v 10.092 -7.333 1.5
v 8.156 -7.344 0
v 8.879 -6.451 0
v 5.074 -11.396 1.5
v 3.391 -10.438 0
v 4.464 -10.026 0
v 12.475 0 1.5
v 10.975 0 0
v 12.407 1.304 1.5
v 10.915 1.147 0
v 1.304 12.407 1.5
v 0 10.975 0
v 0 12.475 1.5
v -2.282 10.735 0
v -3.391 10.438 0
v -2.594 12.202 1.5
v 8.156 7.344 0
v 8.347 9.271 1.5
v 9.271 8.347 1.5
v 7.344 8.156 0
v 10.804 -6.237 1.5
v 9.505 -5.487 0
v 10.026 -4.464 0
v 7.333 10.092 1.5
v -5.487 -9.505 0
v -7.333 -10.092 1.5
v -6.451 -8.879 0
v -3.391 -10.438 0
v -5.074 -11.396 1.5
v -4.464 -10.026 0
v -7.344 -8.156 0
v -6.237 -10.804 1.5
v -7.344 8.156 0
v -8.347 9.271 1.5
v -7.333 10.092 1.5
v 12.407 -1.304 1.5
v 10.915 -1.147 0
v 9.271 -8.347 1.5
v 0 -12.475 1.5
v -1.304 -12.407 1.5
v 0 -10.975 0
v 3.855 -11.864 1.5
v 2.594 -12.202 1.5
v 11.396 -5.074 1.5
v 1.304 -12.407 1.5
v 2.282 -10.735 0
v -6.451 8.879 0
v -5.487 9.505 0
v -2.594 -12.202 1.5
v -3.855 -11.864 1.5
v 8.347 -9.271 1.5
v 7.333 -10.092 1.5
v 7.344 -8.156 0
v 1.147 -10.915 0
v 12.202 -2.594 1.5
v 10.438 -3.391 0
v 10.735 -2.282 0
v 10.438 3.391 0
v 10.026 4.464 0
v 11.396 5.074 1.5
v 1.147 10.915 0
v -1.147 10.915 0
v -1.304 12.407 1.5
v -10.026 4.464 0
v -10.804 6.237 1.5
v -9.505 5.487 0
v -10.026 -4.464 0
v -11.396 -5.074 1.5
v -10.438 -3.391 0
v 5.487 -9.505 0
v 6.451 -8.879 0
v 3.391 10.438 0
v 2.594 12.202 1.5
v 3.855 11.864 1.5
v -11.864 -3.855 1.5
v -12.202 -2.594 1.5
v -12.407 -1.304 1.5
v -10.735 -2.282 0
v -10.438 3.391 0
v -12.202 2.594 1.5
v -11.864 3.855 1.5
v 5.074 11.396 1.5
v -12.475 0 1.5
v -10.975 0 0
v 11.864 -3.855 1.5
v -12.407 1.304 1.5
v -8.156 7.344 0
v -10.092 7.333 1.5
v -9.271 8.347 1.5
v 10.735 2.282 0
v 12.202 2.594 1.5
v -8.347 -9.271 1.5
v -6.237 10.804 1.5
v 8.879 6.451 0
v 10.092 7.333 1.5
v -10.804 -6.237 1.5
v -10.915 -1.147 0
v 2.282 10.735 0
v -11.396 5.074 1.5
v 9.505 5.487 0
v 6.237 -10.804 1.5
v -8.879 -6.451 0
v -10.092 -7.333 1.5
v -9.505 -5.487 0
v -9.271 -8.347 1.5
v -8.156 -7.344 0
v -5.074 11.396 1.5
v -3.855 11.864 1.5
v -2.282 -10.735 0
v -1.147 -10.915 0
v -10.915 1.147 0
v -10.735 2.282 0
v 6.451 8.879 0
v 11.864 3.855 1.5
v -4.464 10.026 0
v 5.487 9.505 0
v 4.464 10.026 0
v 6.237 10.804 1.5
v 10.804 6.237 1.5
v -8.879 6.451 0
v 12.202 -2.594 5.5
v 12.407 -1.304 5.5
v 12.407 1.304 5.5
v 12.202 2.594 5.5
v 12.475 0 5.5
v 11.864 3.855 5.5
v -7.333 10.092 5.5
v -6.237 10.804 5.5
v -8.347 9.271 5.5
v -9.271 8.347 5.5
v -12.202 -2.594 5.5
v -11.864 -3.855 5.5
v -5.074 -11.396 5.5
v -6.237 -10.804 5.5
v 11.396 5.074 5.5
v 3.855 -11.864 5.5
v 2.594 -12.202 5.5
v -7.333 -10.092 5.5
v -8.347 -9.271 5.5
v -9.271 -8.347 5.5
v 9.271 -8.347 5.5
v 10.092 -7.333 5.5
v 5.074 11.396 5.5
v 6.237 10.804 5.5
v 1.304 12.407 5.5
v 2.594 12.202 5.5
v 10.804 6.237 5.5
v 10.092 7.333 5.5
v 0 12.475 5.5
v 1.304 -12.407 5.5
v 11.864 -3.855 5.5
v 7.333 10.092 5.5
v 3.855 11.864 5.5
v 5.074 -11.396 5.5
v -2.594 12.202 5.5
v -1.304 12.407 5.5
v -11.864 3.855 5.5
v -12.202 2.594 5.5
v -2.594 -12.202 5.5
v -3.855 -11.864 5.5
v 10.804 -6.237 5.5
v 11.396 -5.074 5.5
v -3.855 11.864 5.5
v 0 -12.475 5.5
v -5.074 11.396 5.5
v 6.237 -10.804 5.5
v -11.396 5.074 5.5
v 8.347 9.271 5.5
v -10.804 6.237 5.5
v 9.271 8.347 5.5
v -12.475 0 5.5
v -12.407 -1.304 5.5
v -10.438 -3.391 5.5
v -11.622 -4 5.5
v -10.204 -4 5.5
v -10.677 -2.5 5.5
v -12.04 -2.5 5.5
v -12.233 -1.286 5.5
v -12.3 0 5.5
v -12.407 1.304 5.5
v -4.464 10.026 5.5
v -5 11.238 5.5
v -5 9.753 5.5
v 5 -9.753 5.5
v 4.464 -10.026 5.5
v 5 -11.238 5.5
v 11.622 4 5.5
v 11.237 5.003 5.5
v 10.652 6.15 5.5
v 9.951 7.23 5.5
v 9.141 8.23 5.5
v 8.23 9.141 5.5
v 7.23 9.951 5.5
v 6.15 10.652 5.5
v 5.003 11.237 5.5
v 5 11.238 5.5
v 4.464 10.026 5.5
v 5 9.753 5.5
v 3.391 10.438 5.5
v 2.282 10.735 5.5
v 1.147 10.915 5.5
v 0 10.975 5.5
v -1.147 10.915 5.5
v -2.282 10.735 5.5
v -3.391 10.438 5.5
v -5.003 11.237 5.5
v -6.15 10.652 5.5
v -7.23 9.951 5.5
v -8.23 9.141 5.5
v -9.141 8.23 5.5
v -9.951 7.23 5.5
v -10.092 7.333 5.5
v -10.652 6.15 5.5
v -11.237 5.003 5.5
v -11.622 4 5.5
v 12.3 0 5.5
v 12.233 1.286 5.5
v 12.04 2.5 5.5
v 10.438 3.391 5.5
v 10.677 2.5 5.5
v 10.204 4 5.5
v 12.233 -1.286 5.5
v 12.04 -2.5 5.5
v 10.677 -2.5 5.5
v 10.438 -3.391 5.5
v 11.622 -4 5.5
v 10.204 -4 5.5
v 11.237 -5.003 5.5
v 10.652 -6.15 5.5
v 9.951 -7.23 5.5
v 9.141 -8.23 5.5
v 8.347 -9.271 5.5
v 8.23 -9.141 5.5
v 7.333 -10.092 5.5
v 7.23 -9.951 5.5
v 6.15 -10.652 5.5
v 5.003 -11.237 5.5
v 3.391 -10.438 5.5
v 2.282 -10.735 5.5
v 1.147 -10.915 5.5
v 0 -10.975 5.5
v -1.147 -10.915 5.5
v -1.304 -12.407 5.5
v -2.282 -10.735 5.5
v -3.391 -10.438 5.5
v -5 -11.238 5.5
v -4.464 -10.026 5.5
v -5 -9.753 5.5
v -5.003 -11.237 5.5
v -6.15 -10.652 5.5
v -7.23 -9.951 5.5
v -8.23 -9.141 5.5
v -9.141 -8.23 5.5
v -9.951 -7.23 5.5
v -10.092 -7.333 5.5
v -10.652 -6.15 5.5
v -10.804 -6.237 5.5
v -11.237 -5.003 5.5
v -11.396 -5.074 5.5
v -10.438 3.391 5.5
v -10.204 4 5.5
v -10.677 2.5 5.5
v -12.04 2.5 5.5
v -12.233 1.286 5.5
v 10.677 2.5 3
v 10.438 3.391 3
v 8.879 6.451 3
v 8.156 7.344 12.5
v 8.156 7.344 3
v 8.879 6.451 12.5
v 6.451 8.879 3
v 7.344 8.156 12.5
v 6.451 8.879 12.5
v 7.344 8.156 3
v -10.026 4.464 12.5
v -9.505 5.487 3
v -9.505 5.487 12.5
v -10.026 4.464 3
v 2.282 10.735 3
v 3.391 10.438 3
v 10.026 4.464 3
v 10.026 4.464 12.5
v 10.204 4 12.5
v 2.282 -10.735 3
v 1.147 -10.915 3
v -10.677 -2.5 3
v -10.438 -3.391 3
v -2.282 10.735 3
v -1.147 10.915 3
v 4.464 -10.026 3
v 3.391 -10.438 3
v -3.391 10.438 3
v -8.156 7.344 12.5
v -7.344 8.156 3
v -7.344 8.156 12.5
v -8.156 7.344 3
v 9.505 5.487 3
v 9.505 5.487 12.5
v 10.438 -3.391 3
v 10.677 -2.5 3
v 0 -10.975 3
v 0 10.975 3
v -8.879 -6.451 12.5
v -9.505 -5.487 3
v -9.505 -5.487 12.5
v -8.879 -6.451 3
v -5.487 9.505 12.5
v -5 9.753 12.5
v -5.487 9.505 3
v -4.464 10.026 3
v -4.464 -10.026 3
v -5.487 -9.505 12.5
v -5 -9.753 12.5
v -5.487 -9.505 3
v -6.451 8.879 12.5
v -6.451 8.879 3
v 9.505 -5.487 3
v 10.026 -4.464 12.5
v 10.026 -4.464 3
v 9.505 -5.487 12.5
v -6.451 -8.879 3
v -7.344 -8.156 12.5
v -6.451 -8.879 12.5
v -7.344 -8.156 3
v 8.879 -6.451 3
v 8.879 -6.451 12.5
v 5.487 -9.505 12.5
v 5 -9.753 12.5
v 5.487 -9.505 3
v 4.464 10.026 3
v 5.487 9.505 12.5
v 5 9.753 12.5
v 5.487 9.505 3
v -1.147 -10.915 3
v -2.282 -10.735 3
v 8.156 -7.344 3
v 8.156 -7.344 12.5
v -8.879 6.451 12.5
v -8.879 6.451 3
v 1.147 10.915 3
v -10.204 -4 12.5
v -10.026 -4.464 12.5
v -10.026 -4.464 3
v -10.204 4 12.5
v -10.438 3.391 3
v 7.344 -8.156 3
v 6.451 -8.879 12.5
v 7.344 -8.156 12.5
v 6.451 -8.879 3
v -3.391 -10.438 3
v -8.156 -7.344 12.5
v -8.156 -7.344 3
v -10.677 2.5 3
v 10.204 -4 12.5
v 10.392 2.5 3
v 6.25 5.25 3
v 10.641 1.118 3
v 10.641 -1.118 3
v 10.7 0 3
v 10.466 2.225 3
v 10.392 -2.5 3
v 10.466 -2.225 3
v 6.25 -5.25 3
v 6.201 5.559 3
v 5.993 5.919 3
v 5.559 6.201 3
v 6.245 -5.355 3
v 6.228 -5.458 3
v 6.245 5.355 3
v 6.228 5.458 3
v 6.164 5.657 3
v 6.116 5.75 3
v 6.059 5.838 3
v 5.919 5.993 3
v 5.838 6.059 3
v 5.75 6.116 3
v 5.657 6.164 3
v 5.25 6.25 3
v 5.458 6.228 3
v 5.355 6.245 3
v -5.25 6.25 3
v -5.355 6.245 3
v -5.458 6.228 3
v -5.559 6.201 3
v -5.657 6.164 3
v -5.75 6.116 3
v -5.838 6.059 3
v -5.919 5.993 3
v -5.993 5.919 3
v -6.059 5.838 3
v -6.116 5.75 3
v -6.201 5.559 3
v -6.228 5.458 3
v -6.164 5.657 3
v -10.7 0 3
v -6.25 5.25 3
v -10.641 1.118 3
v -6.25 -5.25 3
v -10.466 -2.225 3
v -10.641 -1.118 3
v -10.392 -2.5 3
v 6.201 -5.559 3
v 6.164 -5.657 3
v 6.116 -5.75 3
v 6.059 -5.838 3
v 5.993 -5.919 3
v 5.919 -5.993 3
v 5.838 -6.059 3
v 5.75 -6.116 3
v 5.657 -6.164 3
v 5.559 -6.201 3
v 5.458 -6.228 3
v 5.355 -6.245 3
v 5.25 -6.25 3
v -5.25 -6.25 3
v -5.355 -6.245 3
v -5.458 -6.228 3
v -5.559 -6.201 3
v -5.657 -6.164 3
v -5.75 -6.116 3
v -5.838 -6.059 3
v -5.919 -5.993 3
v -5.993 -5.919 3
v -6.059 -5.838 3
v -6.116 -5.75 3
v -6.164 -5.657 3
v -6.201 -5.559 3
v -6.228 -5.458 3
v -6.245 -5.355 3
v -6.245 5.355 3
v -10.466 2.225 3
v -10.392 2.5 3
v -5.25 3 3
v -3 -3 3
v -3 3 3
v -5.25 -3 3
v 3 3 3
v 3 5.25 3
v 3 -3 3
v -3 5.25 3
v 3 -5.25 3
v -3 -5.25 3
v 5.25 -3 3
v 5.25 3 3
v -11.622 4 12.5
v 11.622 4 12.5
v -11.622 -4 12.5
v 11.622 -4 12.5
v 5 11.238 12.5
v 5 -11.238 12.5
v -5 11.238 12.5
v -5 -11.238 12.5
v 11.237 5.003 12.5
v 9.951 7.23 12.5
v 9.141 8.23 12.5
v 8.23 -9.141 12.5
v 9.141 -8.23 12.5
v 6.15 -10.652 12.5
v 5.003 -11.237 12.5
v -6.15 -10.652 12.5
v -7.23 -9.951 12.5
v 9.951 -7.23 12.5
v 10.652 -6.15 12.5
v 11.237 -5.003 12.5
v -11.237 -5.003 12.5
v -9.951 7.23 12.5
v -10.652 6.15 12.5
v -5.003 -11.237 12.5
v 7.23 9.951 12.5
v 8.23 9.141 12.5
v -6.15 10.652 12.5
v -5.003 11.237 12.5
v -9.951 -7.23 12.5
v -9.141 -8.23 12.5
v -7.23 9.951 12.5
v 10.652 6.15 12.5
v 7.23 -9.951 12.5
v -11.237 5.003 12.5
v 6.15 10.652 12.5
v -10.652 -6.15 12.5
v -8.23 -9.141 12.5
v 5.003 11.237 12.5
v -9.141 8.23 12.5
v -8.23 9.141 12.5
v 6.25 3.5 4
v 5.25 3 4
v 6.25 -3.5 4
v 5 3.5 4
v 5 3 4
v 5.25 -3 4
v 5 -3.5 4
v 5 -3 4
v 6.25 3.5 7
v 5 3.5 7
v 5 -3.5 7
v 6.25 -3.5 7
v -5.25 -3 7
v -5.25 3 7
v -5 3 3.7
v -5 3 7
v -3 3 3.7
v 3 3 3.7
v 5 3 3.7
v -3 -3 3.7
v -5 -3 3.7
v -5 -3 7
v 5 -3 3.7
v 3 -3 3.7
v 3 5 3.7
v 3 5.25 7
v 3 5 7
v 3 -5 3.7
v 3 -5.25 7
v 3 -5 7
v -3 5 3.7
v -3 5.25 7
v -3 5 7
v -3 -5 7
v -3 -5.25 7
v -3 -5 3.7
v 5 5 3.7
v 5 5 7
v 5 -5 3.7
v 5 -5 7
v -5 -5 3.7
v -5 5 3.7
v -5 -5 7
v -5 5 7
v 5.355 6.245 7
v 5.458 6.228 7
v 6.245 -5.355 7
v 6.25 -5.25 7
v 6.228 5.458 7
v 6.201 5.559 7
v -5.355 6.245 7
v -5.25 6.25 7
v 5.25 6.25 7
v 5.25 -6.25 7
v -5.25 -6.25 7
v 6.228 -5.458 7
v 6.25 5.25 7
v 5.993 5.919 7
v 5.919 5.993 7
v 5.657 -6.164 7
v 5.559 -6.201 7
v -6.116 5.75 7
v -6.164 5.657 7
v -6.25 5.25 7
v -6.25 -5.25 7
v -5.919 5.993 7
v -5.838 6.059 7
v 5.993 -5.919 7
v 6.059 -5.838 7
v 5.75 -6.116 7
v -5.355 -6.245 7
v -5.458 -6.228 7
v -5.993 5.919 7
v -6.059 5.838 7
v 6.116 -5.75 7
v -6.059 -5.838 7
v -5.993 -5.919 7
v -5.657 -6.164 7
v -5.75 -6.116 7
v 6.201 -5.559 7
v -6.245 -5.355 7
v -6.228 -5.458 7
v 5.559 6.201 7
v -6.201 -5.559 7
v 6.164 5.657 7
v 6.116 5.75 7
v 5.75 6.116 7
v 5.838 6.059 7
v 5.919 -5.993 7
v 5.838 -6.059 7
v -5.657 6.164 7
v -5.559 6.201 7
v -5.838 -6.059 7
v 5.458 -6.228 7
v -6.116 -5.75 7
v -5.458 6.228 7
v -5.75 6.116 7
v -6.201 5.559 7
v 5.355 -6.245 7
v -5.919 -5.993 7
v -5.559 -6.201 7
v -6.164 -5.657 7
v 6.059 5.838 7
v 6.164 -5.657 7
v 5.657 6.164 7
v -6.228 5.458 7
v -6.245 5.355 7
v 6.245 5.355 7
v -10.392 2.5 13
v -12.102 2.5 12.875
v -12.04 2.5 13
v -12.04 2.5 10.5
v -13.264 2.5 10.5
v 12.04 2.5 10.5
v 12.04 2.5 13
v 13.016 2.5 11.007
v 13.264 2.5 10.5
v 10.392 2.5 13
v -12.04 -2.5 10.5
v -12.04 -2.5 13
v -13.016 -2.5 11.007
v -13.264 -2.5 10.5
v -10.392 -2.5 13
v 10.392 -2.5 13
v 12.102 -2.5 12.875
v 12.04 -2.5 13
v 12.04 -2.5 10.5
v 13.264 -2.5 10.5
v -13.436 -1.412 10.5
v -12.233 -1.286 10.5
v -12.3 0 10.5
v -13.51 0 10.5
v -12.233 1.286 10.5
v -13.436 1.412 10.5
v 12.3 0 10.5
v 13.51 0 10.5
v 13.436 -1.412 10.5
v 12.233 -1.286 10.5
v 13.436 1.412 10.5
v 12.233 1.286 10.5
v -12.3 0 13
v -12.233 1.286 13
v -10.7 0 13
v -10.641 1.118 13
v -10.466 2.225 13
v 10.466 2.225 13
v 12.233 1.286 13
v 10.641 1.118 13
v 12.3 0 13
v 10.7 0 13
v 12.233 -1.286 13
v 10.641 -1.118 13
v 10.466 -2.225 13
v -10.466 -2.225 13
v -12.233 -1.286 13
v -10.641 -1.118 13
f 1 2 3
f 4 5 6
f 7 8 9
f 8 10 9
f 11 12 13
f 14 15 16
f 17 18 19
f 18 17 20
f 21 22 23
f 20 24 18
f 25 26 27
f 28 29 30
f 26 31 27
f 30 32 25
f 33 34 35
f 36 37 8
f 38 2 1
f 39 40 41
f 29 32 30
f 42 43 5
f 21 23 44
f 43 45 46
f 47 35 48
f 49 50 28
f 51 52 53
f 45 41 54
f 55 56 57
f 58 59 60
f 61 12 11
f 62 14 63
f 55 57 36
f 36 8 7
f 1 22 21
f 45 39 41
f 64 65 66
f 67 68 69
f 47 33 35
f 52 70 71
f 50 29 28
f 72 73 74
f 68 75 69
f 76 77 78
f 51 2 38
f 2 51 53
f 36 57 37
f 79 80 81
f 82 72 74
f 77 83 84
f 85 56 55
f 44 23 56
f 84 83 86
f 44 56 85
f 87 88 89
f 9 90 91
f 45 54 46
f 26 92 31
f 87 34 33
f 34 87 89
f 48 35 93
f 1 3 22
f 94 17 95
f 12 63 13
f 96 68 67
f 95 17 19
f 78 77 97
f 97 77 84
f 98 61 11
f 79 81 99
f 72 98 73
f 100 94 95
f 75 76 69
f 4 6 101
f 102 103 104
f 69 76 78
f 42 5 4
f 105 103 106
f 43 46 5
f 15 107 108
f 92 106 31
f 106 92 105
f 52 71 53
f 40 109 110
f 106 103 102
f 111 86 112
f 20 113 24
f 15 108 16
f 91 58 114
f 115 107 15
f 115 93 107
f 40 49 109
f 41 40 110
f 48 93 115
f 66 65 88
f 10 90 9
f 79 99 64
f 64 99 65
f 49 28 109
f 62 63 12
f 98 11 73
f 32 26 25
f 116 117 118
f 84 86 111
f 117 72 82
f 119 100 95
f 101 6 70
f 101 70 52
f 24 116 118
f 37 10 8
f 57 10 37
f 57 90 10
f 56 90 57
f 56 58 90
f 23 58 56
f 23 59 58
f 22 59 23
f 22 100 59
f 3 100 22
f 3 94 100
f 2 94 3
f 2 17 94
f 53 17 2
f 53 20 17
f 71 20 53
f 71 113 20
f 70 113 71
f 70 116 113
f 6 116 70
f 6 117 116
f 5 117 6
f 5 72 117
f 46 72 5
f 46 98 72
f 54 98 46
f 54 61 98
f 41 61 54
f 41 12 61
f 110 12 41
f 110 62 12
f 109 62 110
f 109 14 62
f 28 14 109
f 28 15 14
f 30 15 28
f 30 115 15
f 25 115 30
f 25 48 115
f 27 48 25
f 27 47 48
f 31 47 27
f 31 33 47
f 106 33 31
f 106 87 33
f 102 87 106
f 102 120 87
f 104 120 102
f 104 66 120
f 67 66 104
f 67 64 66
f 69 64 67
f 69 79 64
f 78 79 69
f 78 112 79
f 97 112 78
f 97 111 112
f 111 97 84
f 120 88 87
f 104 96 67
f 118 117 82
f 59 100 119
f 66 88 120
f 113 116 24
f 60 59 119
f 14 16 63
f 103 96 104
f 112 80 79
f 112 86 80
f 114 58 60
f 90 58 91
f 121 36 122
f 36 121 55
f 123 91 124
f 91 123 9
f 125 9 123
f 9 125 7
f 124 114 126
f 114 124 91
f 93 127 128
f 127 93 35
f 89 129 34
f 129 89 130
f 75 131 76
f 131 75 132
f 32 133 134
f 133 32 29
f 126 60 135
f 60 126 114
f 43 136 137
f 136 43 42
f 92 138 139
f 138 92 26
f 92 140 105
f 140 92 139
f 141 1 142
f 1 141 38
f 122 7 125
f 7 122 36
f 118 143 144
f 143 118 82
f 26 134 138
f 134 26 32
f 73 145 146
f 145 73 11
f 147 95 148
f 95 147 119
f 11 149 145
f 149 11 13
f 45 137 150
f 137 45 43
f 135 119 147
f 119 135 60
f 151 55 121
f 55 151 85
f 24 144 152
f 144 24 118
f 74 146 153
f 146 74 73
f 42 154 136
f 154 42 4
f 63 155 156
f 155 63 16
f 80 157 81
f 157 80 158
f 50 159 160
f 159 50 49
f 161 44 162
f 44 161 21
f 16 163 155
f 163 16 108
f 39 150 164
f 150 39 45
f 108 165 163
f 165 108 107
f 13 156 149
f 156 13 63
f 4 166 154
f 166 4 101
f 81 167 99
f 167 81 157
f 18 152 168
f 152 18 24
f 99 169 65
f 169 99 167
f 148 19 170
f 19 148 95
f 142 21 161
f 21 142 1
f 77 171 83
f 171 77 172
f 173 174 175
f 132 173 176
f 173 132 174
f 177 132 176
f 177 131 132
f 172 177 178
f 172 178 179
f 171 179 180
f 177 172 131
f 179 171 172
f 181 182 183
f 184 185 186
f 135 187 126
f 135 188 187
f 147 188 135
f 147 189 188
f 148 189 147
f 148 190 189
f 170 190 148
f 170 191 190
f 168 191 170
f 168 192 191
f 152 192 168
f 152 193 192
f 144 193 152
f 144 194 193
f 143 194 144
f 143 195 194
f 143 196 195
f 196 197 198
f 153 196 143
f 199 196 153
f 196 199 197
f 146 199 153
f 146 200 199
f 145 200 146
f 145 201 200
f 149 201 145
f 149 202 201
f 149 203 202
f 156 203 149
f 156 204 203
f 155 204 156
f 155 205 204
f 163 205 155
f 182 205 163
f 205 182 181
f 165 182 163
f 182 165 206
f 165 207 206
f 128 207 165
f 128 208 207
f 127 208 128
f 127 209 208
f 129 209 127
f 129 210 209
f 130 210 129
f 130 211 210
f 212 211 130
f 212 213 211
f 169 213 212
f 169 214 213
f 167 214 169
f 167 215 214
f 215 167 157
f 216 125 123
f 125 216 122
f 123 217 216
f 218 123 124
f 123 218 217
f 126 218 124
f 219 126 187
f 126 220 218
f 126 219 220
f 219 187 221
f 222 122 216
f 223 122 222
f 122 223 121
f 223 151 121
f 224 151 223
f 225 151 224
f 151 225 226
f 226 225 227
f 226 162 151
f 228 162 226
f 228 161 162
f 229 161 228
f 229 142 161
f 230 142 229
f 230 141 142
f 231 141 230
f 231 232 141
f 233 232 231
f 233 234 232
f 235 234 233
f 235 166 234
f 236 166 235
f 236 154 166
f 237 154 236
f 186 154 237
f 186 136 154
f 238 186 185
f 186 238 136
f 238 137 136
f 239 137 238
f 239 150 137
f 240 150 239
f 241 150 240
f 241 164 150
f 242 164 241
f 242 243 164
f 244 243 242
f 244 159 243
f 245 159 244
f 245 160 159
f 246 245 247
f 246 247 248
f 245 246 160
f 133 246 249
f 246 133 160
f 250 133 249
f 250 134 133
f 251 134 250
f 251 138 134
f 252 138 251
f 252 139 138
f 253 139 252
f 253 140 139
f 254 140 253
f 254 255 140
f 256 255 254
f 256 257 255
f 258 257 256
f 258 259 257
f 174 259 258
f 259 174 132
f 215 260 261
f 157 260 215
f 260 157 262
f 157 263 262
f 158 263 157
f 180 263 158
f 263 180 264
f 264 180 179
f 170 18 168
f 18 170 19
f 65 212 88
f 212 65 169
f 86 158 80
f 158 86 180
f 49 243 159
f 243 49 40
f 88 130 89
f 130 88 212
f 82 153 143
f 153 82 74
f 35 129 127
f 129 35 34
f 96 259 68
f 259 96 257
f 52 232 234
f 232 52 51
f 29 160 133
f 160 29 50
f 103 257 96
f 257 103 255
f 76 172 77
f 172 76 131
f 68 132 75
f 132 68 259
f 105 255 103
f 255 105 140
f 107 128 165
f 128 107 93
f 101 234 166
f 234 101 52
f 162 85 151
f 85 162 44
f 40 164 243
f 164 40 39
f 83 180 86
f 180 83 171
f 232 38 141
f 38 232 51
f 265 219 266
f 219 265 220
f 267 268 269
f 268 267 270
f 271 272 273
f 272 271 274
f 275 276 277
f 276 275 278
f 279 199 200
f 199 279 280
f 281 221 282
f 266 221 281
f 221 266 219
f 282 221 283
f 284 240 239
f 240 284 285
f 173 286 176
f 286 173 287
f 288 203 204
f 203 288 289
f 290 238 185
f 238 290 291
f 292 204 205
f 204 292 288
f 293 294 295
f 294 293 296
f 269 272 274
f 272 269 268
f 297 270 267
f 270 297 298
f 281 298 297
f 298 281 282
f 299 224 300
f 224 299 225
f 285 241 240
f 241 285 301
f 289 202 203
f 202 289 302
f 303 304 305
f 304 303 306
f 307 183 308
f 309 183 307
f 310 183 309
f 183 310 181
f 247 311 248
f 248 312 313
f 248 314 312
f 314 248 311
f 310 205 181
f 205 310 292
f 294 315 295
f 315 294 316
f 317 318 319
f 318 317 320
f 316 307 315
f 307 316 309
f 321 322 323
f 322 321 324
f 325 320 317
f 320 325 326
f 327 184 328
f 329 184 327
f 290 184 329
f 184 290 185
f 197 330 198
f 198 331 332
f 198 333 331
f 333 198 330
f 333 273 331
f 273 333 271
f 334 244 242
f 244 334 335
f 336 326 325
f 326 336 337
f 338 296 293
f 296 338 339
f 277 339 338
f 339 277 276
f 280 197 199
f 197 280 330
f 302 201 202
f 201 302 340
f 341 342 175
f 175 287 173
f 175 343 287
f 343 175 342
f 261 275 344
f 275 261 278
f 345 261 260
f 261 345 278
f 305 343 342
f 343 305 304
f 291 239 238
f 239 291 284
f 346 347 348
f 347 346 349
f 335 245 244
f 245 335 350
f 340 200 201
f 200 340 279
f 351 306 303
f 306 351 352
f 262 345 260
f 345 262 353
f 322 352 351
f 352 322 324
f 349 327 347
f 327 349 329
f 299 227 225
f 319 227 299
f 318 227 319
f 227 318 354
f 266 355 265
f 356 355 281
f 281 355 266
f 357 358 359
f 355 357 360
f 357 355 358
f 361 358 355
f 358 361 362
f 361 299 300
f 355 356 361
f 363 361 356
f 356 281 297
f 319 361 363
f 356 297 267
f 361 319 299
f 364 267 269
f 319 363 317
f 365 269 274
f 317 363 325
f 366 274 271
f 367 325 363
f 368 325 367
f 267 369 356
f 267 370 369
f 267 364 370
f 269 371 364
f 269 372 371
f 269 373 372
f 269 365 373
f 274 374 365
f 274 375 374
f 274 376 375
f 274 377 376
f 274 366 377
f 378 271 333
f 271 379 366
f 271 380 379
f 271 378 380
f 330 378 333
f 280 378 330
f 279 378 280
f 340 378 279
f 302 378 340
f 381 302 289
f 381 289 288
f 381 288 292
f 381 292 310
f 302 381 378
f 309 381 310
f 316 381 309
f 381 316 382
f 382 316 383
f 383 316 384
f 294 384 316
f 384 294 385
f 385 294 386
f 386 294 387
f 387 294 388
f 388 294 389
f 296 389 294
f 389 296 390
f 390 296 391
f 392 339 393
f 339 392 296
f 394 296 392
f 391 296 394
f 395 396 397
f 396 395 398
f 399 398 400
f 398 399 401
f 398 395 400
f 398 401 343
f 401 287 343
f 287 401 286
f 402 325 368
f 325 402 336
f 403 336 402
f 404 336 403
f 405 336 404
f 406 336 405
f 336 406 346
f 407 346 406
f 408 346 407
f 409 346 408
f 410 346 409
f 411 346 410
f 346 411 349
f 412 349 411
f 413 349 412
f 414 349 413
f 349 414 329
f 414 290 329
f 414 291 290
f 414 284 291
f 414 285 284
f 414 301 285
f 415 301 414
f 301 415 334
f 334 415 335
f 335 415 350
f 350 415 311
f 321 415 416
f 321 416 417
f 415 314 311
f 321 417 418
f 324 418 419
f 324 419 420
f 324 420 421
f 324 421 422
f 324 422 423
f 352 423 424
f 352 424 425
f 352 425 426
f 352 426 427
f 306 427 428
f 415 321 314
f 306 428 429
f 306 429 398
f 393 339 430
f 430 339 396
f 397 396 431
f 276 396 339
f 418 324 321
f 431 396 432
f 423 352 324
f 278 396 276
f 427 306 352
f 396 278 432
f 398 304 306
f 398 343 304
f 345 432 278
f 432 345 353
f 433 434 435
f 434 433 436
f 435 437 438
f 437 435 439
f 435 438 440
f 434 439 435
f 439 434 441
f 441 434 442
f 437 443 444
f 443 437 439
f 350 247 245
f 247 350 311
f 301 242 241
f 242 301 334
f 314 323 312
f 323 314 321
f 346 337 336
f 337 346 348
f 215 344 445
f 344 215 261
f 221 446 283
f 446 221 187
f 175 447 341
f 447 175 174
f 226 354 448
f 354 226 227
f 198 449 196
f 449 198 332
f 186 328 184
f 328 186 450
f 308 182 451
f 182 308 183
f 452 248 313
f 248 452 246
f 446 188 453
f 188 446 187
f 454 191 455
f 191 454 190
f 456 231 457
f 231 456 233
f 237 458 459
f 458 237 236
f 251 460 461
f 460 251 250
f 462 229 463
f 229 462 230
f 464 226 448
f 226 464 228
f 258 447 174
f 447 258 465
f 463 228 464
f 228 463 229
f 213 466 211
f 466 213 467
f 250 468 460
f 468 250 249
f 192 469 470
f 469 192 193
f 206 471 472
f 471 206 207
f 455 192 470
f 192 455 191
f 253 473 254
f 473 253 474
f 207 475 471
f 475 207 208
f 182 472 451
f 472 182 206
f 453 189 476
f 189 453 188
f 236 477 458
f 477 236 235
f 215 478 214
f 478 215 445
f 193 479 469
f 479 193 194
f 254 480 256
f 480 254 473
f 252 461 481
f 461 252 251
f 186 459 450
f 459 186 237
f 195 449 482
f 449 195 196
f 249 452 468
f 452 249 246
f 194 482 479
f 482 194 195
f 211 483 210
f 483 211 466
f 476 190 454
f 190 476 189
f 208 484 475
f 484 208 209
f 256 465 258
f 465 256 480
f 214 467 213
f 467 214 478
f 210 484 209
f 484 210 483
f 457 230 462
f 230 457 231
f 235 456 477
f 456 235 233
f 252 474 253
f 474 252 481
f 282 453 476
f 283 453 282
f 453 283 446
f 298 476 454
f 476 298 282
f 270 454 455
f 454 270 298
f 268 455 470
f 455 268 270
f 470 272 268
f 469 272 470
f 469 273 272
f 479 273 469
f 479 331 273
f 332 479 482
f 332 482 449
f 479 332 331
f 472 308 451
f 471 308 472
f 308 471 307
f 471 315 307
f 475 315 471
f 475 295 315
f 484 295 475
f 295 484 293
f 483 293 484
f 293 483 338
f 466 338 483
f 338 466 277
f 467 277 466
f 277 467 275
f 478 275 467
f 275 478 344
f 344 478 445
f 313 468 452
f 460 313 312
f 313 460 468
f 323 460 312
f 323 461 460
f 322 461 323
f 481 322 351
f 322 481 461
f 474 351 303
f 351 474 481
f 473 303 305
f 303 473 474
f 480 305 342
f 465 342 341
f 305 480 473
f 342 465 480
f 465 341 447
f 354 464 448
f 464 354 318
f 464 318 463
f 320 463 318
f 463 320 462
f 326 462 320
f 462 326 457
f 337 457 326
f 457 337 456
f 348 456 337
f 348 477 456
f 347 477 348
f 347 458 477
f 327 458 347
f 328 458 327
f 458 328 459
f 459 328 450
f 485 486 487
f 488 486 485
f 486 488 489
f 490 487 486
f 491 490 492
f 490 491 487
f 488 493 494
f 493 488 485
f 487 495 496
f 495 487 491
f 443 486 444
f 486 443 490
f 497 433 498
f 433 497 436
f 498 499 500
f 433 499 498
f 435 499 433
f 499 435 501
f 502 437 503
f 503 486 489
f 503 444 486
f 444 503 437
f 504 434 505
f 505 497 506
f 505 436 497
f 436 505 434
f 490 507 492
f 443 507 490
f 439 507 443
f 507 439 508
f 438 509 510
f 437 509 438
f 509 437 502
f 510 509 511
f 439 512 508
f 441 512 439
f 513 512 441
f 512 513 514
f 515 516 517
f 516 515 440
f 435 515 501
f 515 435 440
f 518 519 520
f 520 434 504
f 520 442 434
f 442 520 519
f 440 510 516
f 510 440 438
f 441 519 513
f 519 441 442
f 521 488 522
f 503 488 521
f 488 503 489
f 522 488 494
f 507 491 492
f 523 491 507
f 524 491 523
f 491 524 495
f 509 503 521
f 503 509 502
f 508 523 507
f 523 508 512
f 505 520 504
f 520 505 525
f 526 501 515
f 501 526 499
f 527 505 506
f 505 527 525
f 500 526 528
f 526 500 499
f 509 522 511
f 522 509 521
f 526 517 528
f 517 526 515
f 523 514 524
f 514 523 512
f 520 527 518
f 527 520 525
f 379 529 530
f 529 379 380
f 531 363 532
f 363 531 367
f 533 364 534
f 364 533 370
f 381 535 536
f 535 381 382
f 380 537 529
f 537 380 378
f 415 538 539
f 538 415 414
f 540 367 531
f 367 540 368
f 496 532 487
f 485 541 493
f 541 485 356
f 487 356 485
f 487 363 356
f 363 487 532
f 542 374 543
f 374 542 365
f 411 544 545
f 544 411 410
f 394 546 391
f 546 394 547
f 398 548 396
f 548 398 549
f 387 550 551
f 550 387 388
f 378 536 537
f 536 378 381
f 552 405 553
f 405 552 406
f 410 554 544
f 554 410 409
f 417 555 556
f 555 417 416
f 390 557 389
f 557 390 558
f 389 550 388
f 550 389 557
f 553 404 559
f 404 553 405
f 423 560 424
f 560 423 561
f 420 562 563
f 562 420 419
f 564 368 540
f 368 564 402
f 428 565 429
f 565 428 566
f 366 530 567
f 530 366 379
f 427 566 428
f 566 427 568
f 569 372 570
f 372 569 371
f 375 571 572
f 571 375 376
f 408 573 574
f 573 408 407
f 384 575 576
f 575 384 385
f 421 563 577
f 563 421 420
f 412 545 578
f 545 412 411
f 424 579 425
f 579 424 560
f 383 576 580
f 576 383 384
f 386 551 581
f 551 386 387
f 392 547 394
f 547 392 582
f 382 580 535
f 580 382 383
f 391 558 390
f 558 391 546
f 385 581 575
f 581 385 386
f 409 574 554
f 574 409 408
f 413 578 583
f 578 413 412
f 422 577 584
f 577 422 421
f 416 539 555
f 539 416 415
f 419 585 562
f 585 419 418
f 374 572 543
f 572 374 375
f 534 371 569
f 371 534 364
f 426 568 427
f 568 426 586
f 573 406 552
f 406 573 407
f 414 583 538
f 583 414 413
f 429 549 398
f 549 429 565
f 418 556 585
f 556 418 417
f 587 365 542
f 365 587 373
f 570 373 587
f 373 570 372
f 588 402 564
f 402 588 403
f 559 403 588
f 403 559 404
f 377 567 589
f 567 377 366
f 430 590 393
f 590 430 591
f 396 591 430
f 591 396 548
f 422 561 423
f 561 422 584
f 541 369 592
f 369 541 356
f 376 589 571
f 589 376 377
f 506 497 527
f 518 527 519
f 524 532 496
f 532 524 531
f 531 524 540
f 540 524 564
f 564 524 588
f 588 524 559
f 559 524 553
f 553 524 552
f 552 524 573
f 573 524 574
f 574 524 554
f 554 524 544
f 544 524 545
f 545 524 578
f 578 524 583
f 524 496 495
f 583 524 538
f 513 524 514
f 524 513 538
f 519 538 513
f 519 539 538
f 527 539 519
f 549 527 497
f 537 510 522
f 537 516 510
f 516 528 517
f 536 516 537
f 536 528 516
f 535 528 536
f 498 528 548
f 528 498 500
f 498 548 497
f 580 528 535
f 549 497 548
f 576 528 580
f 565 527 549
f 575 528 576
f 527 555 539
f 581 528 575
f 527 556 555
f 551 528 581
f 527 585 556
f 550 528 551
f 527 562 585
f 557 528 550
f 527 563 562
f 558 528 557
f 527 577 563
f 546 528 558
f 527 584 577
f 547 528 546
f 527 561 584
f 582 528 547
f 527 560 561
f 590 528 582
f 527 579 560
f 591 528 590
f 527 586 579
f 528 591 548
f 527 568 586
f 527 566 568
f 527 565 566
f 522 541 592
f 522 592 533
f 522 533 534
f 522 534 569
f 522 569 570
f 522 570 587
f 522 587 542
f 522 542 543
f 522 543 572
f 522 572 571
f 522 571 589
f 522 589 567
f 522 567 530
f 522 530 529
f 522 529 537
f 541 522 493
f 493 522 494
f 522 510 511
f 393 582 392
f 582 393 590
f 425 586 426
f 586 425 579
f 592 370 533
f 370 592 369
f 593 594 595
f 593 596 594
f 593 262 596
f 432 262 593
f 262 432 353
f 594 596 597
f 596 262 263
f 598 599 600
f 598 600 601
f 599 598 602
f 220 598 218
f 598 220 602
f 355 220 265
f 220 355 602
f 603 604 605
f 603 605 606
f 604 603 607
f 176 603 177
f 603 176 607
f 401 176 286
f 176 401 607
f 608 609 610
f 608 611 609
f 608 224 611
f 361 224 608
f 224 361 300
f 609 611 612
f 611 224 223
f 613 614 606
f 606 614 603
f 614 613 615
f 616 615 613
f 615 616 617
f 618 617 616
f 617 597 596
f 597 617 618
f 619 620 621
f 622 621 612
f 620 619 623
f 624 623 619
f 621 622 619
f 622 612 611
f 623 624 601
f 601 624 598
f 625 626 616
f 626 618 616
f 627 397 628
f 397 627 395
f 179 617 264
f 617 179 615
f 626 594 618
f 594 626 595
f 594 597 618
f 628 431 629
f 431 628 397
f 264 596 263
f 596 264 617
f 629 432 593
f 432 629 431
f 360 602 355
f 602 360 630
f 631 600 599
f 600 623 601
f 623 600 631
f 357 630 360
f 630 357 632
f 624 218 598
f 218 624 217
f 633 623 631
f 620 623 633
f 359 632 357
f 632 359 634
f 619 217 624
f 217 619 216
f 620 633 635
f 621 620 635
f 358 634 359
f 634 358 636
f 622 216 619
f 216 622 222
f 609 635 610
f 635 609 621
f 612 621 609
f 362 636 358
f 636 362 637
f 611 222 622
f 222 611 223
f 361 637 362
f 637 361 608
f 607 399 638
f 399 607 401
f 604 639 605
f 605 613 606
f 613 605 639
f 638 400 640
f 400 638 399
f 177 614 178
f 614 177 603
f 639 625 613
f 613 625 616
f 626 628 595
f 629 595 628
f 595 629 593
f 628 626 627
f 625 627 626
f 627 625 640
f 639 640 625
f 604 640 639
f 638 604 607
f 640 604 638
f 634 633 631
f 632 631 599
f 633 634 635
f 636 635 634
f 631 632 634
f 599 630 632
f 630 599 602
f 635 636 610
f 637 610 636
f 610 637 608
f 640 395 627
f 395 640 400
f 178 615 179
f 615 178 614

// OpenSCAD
$fn=60;

d_button=24.95;
d_minor=24.6;

t_total=12.56;
l_tab=4;

t_bevel=1.5;
    t_face=t_bevel+1.5;
    h_face=4;
    t_shell=1.5;


main();

//cap();

//clip_shape();

module cap(){
    cap_size=16;
    cap_base_d=13;
    cap_height=9.5;
    cap_stem_height=4;
    cap_cavity_size=13.5;
    difference(){
        union(){
            hull(){
                cylinder(d=cap_base_d,h=1);
                translate([-cap_size/2,-cap_size/2,cap_stem_height])
                    rcube([16,16,cap_height-cap_stem_height]);
            }
        }
        union(){
            translate([-cap_cavity_size/2,-cap_cavity_size/2,cap_stem_height])
                    rcube([cap_cavity_size,cap_cavity_size,15]);

            //button slot
            translate([-1.1,-3.3,0])
                cube([2.2,6.6,14]);
            //notch for wires
            translate([0,-3.5,cap_stem_height])
                cube([10,7,10]);
            
        }
    }
}


module clip_shape(){
    translate([d_minor/2-1.6,.5+t_bevel])
    polygon(points=[
        [0,0],
        [1.6,0],
        [1.6,8.5],
        [2.81,8.5],
        [1.6,11],
        [0,11]

    ]);
}

module main(){
    


    difference(){
        union(){
            cylinder(d1=d_button-t_bevel*2,d2=d_button,h=t_bevel);
            translate([0,0,t_bevel])
                cylinder(d=d_button,h=h_face);
        }
        union(){
            translate([0,0,t_face])
                cylinder(d=d_button-t_shell*2,h=h_face);
        }
    }

    difference(){
        union(){
            translate([0,0,t_bevel])
                cylinder(d=d_minor,h=11);
        }
        union(){
            translate([-20,-4,4.5])
                cube([40,8,20]);

            translate([-5,-20,4.5])
                cube([10,40,20]);

            cylinder(d=d_button - 2*t_shell, h=20);
        }
    }

    pixel_holder_size=12.5;
    
    difference(){
        union(){
            translate([-pixel_holder_size/2,-pixel_holder_size/2,0])
                rcube([pixel_holder_size,pixel_holder_size,t_face+4]);
        }
        union(){
            translate([0,-3.5,4])
                cube([10,7,10]);

            translate([-5.25,-3,2.5])
                cube([10.5,6,10]);
            translate([-3,-5.25,2.5])
                cube([6,10.5,10]);
            
            translate([-5,-5,3.7])
                cube([10,10,10]);
                
        }
    }

    intersection(){
        translate([-20,-2.5,0])
            cube([40,5,40]);
        rotate_extrude(){
            clip_shape();
        }
    }
    
}

module rcube(size,r=1){
    hull(){
        for(x=[r,size[0]-r])
            for (y=[r,size[1]-r])
                translate([x,y,0])
                    cylinder(r=r,h=size[2]);
    }
            
}
